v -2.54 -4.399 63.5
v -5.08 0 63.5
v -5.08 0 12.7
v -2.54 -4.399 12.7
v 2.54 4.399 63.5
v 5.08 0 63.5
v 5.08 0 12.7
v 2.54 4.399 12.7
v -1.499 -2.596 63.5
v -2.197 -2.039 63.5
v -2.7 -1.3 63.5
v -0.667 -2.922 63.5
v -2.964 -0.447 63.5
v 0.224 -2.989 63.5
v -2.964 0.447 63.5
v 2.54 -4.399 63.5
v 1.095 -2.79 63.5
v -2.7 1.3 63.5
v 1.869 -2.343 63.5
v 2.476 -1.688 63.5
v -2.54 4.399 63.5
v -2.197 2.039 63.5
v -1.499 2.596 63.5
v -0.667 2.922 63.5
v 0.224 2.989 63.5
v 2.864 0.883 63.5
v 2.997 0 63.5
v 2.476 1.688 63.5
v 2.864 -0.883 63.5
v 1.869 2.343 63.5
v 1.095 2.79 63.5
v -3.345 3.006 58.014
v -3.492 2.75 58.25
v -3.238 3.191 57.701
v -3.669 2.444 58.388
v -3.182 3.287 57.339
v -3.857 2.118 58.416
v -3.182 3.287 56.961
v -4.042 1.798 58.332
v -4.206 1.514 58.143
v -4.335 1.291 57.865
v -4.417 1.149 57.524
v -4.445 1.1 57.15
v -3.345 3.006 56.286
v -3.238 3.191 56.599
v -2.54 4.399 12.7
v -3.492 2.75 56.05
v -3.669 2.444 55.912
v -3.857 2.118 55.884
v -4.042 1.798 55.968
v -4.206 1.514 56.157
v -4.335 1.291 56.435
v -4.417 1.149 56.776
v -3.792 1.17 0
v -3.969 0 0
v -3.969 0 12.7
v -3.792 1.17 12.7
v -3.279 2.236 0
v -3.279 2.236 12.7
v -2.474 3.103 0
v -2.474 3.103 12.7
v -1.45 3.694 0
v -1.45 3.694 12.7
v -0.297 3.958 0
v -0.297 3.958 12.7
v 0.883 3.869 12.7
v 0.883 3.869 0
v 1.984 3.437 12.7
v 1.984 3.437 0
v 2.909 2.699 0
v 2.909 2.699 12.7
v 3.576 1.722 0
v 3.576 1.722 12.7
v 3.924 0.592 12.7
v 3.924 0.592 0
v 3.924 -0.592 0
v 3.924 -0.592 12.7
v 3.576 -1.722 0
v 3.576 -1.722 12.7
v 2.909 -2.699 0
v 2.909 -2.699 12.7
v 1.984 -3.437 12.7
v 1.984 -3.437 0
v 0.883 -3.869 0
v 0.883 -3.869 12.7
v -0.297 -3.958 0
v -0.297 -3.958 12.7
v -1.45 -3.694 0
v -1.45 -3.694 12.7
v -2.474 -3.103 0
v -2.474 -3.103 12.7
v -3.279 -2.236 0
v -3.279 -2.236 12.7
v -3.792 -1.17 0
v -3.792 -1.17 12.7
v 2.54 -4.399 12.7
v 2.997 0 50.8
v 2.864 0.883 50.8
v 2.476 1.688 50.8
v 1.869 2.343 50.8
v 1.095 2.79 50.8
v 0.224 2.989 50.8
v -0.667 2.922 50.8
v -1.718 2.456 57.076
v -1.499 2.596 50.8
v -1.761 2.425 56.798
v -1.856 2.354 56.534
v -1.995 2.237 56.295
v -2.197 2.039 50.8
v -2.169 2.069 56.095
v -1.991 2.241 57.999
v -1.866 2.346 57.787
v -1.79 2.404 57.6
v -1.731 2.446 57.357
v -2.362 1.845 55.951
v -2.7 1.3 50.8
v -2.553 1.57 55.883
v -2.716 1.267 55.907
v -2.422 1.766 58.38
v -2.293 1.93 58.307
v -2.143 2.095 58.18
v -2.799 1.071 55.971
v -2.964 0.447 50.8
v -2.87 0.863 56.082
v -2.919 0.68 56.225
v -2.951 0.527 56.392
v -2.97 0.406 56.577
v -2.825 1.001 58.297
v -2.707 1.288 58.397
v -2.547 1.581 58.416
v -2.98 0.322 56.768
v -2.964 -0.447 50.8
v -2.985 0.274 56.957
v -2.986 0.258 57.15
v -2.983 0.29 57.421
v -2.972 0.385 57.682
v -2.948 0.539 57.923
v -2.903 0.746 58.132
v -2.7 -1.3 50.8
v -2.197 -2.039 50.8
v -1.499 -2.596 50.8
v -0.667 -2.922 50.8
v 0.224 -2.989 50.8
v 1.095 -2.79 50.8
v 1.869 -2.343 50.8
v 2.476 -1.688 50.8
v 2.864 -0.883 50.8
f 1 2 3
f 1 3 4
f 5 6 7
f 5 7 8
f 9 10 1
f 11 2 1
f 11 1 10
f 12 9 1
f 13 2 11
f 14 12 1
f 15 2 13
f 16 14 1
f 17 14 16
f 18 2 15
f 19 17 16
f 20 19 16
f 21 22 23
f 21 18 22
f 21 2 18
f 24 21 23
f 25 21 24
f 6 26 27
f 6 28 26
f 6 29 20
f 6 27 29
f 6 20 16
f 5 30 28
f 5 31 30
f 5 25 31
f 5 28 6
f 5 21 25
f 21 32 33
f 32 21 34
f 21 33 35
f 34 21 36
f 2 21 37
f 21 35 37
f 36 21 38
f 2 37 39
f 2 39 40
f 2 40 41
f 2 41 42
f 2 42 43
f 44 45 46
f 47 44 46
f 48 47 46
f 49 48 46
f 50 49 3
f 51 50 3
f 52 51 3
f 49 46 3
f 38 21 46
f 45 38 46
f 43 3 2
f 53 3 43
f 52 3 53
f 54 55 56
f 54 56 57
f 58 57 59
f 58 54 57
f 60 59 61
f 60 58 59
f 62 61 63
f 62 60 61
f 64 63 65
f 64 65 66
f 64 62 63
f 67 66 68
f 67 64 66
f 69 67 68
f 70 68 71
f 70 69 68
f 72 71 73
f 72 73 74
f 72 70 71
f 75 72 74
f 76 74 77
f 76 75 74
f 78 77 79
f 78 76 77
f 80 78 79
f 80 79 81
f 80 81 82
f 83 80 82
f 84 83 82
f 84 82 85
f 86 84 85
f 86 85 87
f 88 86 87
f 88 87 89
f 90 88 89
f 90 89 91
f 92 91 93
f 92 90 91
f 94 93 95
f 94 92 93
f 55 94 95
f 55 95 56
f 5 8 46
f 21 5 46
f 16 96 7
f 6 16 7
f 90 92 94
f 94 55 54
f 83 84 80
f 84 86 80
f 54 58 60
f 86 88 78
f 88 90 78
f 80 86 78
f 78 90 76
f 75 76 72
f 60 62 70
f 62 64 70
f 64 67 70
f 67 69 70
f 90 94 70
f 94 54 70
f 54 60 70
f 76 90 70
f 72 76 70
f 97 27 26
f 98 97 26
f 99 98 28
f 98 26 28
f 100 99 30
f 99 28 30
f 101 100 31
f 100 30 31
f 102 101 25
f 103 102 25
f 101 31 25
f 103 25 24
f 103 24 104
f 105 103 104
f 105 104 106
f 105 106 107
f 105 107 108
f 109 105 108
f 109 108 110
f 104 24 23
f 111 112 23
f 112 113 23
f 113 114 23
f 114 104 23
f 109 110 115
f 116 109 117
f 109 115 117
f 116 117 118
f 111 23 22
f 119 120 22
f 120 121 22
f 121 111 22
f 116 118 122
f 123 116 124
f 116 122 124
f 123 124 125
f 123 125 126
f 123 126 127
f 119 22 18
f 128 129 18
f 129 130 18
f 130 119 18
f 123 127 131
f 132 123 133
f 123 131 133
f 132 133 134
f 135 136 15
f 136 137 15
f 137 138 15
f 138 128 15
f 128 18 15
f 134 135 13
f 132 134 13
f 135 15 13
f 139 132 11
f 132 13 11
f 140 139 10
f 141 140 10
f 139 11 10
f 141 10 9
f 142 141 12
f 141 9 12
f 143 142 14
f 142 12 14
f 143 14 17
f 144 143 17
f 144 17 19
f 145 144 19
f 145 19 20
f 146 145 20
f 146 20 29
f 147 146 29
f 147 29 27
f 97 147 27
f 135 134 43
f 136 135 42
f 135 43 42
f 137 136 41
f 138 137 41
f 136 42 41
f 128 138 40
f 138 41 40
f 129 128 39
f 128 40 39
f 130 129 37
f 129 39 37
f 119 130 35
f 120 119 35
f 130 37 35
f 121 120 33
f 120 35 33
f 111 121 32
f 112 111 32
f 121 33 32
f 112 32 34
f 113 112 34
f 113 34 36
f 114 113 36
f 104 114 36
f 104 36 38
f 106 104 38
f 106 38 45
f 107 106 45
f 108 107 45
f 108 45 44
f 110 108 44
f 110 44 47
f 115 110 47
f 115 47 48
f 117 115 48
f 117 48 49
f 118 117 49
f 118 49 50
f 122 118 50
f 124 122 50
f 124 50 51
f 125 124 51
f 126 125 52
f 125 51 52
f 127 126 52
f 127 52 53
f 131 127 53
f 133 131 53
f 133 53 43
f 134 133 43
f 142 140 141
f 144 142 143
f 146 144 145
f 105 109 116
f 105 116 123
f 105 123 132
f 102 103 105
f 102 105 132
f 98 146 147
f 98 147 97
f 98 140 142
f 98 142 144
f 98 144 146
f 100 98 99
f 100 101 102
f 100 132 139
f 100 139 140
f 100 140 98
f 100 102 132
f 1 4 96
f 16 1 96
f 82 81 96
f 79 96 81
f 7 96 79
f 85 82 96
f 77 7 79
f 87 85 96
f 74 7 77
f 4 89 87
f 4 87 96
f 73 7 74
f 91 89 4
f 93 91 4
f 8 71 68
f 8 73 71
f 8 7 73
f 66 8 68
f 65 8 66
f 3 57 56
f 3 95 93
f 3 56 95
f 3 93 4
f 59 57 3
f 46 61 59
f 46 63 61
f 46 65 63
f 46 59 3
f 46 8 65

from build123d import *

# Parameters (mm, degrees)
BOSS_EXTRUDE1_DEPTH = 63.5
SKETCH2_R           = 2.9972
CUT_EXTRUDE1_DEPTH  = 12.7
SKETCH3_R           = 3.96875
CUT_EXTRUDE2_DEPTH  = 12.7
SKETCH4_R           = 1.27
CUT_EXTRUDE3_DEPTH  = 5.08


with BuildPart() as part:
    # Sketch1 → Boss-Extrude1 (new body)
    with BuildSketch(Plane.XY):
        Polygon((5.08, 0), (2.54, 4.399409051), (-2.54, 4.399409051), (-5.08, 0), (-2.54, -4.399409051), (2.54, -4.399409051), align=None)
    extrude(amount=BOSS_EXTRUDE1_DEPTH)

    # Sketch2 → Cut-Extrude1 (cut)
    with BuildSketch(Plane.XY.offset(63.5)):
        Circle(SKETCH2_R)
    extrude(amount=-CUT_EXTRUDE1_DEPTH, mode=Mode.SUBTRACT)

    # Sketch3 → Cut-Extrude2 (cut)
    with BuildSketch(Plane(origin=(0, 0, 0), x_dir=(-1, 0, 0), z_dir=(0, 0, -1))):
        Polygon((5.08, 0), (2.54, 4.399409051), (-2.54, 4.399409051), (-5.08, 0), (-2.54, -4.399409051), (2.54, -4.399409051), align=None)
        Circle(SKETCH3_R, mode=Mode.SUBTRACT)
    extrude(amount=-CUT_EXTRUDE2_DEPTH, mode=Mode.SUBTRACT)

    # Sketch4 → Cut-Extrude3 (cut)
    with BuildSketch(Plane(origin=(-3.81, 2.199704526, 0), x_dir=(0, 0, 1), z_dir=(-0.8660254037844385, 0.5000000000000004, 0))):
        with Locations(Location((57.15, 0, 0), (0, 0, 270))):
            Circle(SKETCH4_R)
    extrude(amount=-CUT_EXTRUDE3_DEPTH, mode=Mode.SUBTRACT)


solid = part.part
